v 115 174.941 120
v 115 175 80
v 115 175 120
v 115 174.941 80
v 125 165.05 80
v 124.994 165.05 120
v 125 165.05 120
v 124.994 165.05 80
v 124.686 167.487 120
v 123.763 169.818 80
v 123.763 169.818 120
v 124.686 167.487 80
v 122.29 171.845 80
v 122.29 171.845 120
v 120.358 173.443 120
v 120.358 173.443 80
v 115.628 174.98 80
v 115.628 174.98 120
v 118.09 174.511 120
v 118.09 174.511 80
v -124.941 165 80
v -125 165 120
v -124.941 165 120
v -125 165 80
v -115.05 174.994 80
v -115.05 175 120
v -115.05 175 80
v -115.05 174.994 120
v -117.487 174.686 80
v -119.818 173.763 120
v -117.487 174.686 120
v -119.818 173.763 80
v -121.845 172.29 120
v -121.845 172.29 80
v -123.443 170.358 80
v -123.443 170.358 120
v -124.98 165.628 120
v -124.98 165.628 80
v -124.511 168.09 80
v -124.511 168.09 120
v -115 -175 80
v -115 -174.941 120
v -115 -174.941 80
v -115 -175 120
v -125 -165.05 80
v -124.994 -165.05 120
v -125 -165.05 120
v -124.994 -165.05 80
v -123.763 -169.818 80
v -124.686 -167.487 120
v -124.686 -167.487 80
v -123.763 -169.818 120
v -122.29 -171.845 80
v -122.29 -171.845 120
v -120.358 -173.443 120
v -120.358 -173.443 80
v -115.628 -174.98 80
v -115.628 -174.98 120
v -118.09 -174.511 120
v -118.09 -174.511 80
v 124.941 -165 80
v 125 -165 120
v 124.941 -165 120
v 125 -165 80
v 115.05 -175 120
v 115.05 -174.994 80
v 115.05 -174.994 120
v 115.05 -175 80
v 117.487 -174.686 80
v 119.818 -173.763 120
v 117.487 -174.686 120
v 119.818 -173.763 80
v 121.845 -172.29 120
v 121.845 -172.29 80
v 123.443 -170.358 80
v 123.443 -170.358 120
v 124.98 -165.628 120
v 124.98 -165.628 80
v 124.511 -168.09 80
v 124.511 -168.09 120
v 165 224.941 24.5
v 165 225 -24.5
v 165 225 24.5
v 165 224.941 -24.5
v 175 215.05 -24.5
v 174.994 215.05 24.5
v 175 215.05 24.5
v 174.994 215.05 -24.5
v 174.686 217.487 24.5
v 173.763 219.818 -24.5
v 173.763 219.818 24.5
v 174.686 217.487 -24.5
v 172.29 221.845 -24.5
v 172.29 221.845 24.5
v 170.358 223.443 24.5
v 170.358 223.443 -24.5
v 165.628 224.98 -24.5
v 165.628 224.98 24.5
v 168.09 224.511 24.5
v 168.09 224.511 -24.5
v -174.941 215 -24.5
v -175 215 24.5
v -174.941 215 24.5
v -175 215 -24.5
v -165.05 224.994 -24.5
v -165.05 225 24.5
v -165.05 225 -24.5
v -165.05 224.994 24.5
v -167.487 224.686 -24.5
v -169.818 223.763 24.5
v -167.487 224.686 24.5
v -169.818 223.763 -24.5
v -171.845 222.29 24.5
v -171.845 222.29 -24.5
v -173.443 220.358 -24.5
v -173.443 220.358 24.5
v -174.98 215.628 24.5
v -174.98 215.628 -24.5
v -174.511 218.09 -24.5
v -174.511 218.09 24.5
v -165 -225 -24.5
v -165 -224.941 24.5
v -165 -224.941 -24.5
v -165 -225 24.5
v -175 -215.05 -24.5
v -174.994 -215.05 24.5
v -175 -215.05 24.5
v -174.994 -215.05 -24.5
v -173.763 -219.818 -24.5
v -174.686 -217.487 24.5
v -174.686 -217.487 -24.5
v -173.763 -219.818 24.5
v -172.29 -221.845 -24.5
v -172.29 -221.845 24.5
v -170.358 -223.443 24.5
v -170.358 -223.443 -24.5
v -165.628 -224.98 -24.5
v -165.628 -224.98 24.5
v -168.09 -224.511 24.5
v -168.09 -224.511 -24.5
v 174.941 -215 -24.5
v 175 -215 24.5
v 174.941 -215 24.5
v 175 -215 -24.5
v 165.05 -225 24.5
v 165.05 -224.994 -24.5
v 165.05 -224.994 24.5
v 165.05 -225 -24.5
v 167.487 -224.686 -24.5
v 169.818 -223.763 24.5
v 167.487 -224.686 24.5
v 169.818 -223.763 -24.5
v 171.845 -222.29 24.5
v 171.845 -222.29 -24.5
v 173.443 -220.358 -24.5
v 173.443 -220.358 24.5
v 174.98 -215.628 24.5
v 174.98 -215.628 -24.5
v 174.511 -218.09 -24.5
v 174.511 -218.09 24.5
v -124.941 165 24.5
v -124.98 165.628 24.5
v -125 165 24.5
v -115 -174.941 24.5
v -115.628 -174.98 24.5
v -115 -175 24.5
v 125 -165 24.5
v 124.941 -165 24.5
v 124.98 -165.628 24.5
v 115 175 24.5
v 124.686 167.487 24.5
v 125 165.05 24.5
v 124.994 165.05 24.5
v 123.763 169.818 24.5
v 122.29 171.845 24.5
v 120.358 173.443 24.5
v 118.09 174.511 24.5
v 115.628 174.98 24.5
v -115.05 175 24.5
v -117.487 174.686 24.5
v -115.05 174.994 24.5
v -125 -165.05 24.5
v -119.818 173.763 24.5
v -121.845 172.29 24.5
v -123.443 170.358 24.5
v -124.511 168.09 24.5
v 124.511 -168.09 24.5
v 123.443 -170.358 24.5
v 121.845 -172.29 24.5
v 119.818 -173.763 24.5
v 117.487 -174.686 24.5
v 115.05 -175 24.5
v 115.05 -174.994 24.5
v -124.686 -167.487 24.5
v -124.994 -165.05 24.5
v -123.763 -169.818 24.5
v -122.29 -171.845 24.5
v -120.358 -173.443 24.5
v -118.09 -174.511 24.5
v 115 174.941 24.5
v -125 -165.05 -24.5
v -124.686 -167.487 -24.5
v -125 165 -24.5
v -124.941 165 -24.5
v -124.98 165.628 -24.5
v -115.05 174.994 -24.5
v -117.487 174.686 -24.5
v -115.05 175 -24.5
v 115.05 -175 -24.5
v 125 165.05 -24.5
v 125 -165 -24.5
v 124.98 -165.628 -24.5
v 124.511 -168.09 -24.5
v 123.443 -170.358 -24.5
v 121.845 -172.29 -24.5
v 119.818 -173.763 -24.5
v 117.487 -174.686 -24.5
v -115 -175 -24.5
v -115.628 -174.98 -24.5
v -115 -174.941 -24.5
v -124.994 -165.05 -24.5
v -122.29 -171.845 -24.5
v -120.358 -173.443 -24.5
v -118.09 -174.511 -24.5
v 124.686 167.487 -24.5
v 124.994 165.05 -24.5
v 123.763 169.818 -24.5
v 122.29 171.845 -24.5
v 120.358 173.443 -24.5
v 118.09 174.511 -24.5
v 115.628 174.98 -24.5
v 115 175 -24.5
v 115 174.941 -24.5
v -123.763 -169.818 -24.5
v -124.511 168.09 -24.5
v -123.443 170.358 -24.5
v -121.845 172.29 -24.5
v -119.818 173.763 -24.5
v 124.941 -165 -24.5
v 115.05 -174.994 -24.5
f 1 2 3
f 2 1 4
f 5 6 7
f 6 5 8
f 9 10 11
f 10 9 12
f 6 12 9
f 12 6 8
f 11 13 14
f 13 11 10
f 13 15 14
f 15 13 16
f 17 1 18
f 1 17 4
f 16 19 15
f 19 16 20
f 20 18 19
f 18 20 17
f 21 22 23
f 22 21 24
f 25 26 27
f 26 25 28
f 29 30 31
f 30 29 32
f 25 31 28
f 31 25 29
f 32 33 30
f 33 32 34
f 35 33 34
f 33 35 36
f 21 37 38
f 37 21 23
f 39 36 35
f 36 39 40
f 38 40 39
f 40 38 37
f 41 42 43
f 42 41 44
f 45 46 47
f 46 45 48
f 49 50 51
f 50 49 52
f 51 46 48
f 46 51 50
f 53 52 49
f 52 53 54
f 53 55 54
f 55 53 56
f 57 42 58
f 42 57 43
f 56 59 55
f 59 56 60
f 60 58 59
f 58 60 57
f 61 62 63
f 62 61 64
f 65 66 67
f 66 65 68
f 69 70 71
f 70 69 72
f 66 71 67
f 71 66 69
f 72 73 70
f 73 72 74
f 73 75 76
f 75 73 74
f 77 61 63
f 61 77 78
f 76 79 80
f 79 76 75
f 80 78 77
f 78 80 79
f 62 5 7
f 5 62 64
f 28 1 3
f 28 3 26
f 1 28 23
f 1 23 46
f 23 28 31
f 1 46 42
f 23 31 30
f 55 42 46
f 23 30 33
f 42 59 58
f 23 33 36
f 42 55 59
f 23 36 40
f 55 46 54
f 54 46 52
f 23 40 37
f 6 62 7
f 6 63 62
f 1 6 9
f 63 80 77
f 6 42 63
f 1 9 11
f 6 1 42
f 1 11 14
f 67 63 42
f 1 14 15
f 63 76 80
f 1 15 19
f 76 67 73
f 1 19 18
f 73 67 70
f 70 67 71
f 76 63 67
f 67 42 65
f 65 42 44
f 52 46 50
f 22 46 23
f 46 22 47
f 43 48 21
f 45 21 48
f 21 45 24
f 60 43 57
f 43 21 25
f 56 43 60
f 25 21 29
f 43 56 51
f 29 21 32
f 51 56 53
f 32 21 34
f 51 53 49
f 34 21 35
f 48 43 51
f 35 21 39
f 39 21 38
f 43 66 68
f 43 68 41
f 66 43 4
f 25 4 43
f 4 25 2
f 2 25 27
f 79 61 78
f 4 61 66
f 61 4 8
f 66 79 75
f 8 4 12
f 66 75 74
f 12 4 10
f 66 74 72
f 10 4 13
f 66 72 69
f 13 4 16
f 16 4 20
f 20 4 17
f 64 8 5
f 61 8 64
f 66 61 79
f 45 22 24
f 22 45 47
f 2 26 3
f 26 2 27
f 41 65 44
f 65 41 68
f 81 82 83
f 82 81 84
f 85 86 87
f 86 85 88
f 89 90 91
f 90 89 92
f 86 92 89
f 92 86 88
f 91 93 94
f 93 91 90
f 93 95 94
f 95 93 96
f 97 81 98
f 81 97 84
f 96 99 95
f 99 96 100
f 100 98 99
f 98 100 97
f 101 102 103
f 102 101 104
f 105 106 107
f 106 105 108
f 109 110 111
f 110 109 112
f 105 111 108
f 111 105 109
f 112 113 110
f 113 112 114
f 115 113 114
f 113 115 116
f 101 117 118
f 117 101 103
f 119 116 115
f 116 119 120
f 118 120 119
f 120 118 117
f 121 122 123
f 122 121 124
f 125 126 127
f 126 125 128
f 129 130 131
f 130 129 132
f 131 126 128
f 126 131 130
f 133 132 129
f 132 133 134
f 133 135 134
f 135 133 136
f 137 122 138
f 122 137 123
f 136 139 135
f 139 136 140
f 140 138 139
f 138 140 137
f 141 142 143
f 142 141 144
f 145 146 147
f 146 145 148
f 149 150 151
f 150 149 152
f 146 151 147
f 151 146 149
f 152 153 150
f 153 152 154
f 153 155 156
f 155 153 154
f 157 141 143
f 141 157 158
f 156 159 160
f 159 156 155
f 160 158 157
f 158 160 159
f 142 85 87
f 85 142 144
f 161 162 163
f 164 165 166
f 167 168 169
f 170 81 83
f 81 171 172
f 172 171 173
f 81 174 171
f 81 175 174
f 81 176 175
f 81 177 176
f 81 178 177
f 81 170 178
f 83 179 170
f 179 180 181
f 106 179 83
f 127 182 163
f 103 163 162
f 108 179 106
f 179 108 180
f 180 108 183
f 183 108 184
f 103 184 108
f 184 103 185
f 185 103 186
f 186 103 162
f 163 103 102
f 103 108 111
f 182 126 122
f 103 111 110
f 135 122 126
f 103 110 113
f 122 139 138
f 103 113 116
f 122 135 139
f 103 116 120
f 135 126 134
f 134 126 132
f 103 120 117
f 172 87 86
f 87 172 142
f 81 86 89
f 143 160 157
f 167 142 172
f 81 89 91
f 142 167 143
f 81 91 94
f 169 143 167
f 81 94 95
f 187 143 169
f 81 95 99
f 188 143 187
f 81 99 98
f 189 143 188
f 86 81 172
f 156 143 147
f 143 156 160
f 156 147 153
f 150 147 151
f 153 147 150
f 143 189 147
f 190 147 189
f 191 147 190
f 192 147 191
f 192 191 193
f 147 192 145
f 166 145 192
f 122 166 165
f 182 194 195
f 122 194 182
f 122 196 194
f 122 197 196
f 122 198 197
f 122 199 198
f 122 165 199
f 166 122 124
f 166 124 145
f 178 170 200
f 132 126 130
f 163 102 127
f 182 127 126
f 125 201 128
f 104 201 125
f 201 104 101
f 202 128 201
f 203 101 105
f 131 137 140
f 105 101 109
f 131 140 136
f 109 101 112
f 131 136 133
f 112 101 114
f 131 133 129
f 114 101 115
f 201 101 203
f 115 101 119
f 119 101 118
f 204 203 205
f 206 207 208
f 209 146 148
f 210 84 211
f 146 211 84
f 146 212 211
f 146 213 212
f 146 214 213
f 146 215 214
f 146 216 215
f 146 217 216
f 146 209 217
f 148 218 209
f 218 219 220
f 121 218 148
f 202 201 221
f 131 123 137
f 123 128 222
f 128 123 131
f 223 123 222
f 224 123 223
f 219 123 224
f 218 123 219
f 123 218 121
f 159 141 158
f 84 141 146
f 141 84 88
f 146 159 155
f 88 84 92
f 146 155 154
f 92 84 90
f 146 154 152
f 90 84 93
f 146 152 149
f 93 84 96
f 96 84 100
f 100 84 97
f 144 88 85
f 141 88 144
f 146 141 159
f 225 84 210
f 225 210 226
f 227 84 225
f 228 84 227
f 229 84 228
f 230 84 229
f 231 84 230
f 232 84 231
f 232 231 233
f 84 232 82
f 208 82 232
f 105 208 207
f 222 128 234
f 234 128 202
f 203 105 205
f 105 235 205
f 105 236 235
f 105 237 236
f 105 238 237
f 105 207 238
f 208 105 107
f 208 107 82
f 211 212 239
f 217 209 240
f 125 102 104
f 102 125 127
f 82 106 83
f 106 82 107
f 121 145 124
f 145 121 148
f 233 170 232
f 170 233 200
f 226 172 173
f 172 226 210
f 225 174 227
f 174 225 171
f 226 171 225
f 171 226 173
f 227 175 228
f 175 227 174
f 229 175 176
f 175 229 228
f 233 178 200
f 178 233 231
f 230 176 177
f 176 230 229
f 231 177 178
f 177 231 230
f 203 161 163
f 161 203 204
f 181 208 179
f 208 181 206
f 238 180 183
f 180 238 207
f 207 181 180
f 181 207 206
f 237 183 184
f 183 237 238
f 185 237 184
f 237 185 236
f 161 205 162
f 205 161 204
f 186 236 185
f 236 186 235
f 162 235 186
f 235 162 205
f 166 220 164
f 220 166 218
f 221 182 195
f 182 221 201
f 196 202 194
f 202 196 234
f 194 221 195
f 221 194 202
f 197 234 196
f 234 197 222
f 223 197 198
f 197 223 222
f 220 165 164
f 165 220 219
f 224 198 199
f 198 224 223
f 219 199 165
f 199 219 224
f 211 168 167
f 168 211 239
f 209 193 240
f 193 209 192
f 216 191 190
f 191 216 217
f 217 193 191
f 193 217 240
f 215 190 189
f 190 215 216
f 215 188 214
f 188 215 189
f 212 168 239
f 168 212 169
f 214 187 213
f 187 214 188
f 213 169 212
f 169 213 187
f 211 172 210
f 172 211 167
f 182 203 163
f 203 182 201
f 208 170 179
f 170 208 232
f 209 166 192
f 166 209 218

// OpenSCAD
/*
http://codeviewer.org/view/code:1b36 
Copyright (C) 2011 Sergio Vilches
This program is free software: you can redistribute it and/or modify it under the terms of the GNU General Public License as published by the Free Software Foundation, either version 3 of the License, or (at your option) any later version.
This program is distributed in the hope that it will be useful, but WITHOUT ANY WARRANTY; without even the implied warranty of MERCHANTABILITY or FITNESS FOR A PARTICULAR PURPOSE. See the GNU General Public License for more details. You should have received a copy of the GNU General Public License along with this program. If not, see <http://www.gnu.org/licenses/>.
Contact: s.vilches.e@gmail.com


    ----------------------------------------------------------- 
                 Round Corners Cube (Extruded)                
      roundCornersCube(x,y,z,r) Where:                        
         - x = Xdir width                                     
         - y = Ydir width                                     
         - z = Height of the cube                             
         - r = Rounding radious                               
                                                              
      Example: roundCornerCube(10,10,2,1);                    
     *Some times it's needed to use F6 to see good results!   
 	 ----------------------------------------------------------- 
*/
// Test it!
punch();

matrice();

module punch() {
translate([0,0,100]) 
 roundCornersCube(250,350,40,10);
}



module matrice() {
difference()
{
 roundCornersCube(350,450,49,10);
 roundCornersCube(250,350,50,10);
}
}

module createMeniscus(h,radius) // This module creates the shape that needs to be substracted from a cube to make its corners rounded.
difference(){        //This shape is basicly the difference between a quarter of cylinder and a cube
   translate([radius/2+0.1,radius/2+0.1,0]){
      cube([radius+0.2,radius+0.1,h+0.2],center=true);         // All that 0.x numbers are to avoid "ghost boundaries" when substracting
   }

   cylinder(h=h+0.2,r=radius,$fn = 25,center=true);
}


module roundCornersCube(x,y,z,r)  // Now we just substract the shape we have created in the four corners
difference(){
   cube([x,y,z], center=true);

translate([x/2-r,y/2-r]){  // We move to the first corner (x,y)
      rotate(0){  
         createMeniscus(z,r); // And substract the meniscus
      }
   }
   translate([-x/2+r,y/2-r]){ // To the second corner (-x,y)
      rotate(90){
         createMeniscus(z,r); // But this time we have to rotate the meniscus 90 deg
      }
   }
      translate([-x/2+r,-y/2+r]){ // ... 
      rotate(180){
         createMeniscus(z,r);
      }
   }
      translate([x/2-r,-y/2+r]){
      rotate(270){
         createMeniscus(z,r);
      }
   }
}
